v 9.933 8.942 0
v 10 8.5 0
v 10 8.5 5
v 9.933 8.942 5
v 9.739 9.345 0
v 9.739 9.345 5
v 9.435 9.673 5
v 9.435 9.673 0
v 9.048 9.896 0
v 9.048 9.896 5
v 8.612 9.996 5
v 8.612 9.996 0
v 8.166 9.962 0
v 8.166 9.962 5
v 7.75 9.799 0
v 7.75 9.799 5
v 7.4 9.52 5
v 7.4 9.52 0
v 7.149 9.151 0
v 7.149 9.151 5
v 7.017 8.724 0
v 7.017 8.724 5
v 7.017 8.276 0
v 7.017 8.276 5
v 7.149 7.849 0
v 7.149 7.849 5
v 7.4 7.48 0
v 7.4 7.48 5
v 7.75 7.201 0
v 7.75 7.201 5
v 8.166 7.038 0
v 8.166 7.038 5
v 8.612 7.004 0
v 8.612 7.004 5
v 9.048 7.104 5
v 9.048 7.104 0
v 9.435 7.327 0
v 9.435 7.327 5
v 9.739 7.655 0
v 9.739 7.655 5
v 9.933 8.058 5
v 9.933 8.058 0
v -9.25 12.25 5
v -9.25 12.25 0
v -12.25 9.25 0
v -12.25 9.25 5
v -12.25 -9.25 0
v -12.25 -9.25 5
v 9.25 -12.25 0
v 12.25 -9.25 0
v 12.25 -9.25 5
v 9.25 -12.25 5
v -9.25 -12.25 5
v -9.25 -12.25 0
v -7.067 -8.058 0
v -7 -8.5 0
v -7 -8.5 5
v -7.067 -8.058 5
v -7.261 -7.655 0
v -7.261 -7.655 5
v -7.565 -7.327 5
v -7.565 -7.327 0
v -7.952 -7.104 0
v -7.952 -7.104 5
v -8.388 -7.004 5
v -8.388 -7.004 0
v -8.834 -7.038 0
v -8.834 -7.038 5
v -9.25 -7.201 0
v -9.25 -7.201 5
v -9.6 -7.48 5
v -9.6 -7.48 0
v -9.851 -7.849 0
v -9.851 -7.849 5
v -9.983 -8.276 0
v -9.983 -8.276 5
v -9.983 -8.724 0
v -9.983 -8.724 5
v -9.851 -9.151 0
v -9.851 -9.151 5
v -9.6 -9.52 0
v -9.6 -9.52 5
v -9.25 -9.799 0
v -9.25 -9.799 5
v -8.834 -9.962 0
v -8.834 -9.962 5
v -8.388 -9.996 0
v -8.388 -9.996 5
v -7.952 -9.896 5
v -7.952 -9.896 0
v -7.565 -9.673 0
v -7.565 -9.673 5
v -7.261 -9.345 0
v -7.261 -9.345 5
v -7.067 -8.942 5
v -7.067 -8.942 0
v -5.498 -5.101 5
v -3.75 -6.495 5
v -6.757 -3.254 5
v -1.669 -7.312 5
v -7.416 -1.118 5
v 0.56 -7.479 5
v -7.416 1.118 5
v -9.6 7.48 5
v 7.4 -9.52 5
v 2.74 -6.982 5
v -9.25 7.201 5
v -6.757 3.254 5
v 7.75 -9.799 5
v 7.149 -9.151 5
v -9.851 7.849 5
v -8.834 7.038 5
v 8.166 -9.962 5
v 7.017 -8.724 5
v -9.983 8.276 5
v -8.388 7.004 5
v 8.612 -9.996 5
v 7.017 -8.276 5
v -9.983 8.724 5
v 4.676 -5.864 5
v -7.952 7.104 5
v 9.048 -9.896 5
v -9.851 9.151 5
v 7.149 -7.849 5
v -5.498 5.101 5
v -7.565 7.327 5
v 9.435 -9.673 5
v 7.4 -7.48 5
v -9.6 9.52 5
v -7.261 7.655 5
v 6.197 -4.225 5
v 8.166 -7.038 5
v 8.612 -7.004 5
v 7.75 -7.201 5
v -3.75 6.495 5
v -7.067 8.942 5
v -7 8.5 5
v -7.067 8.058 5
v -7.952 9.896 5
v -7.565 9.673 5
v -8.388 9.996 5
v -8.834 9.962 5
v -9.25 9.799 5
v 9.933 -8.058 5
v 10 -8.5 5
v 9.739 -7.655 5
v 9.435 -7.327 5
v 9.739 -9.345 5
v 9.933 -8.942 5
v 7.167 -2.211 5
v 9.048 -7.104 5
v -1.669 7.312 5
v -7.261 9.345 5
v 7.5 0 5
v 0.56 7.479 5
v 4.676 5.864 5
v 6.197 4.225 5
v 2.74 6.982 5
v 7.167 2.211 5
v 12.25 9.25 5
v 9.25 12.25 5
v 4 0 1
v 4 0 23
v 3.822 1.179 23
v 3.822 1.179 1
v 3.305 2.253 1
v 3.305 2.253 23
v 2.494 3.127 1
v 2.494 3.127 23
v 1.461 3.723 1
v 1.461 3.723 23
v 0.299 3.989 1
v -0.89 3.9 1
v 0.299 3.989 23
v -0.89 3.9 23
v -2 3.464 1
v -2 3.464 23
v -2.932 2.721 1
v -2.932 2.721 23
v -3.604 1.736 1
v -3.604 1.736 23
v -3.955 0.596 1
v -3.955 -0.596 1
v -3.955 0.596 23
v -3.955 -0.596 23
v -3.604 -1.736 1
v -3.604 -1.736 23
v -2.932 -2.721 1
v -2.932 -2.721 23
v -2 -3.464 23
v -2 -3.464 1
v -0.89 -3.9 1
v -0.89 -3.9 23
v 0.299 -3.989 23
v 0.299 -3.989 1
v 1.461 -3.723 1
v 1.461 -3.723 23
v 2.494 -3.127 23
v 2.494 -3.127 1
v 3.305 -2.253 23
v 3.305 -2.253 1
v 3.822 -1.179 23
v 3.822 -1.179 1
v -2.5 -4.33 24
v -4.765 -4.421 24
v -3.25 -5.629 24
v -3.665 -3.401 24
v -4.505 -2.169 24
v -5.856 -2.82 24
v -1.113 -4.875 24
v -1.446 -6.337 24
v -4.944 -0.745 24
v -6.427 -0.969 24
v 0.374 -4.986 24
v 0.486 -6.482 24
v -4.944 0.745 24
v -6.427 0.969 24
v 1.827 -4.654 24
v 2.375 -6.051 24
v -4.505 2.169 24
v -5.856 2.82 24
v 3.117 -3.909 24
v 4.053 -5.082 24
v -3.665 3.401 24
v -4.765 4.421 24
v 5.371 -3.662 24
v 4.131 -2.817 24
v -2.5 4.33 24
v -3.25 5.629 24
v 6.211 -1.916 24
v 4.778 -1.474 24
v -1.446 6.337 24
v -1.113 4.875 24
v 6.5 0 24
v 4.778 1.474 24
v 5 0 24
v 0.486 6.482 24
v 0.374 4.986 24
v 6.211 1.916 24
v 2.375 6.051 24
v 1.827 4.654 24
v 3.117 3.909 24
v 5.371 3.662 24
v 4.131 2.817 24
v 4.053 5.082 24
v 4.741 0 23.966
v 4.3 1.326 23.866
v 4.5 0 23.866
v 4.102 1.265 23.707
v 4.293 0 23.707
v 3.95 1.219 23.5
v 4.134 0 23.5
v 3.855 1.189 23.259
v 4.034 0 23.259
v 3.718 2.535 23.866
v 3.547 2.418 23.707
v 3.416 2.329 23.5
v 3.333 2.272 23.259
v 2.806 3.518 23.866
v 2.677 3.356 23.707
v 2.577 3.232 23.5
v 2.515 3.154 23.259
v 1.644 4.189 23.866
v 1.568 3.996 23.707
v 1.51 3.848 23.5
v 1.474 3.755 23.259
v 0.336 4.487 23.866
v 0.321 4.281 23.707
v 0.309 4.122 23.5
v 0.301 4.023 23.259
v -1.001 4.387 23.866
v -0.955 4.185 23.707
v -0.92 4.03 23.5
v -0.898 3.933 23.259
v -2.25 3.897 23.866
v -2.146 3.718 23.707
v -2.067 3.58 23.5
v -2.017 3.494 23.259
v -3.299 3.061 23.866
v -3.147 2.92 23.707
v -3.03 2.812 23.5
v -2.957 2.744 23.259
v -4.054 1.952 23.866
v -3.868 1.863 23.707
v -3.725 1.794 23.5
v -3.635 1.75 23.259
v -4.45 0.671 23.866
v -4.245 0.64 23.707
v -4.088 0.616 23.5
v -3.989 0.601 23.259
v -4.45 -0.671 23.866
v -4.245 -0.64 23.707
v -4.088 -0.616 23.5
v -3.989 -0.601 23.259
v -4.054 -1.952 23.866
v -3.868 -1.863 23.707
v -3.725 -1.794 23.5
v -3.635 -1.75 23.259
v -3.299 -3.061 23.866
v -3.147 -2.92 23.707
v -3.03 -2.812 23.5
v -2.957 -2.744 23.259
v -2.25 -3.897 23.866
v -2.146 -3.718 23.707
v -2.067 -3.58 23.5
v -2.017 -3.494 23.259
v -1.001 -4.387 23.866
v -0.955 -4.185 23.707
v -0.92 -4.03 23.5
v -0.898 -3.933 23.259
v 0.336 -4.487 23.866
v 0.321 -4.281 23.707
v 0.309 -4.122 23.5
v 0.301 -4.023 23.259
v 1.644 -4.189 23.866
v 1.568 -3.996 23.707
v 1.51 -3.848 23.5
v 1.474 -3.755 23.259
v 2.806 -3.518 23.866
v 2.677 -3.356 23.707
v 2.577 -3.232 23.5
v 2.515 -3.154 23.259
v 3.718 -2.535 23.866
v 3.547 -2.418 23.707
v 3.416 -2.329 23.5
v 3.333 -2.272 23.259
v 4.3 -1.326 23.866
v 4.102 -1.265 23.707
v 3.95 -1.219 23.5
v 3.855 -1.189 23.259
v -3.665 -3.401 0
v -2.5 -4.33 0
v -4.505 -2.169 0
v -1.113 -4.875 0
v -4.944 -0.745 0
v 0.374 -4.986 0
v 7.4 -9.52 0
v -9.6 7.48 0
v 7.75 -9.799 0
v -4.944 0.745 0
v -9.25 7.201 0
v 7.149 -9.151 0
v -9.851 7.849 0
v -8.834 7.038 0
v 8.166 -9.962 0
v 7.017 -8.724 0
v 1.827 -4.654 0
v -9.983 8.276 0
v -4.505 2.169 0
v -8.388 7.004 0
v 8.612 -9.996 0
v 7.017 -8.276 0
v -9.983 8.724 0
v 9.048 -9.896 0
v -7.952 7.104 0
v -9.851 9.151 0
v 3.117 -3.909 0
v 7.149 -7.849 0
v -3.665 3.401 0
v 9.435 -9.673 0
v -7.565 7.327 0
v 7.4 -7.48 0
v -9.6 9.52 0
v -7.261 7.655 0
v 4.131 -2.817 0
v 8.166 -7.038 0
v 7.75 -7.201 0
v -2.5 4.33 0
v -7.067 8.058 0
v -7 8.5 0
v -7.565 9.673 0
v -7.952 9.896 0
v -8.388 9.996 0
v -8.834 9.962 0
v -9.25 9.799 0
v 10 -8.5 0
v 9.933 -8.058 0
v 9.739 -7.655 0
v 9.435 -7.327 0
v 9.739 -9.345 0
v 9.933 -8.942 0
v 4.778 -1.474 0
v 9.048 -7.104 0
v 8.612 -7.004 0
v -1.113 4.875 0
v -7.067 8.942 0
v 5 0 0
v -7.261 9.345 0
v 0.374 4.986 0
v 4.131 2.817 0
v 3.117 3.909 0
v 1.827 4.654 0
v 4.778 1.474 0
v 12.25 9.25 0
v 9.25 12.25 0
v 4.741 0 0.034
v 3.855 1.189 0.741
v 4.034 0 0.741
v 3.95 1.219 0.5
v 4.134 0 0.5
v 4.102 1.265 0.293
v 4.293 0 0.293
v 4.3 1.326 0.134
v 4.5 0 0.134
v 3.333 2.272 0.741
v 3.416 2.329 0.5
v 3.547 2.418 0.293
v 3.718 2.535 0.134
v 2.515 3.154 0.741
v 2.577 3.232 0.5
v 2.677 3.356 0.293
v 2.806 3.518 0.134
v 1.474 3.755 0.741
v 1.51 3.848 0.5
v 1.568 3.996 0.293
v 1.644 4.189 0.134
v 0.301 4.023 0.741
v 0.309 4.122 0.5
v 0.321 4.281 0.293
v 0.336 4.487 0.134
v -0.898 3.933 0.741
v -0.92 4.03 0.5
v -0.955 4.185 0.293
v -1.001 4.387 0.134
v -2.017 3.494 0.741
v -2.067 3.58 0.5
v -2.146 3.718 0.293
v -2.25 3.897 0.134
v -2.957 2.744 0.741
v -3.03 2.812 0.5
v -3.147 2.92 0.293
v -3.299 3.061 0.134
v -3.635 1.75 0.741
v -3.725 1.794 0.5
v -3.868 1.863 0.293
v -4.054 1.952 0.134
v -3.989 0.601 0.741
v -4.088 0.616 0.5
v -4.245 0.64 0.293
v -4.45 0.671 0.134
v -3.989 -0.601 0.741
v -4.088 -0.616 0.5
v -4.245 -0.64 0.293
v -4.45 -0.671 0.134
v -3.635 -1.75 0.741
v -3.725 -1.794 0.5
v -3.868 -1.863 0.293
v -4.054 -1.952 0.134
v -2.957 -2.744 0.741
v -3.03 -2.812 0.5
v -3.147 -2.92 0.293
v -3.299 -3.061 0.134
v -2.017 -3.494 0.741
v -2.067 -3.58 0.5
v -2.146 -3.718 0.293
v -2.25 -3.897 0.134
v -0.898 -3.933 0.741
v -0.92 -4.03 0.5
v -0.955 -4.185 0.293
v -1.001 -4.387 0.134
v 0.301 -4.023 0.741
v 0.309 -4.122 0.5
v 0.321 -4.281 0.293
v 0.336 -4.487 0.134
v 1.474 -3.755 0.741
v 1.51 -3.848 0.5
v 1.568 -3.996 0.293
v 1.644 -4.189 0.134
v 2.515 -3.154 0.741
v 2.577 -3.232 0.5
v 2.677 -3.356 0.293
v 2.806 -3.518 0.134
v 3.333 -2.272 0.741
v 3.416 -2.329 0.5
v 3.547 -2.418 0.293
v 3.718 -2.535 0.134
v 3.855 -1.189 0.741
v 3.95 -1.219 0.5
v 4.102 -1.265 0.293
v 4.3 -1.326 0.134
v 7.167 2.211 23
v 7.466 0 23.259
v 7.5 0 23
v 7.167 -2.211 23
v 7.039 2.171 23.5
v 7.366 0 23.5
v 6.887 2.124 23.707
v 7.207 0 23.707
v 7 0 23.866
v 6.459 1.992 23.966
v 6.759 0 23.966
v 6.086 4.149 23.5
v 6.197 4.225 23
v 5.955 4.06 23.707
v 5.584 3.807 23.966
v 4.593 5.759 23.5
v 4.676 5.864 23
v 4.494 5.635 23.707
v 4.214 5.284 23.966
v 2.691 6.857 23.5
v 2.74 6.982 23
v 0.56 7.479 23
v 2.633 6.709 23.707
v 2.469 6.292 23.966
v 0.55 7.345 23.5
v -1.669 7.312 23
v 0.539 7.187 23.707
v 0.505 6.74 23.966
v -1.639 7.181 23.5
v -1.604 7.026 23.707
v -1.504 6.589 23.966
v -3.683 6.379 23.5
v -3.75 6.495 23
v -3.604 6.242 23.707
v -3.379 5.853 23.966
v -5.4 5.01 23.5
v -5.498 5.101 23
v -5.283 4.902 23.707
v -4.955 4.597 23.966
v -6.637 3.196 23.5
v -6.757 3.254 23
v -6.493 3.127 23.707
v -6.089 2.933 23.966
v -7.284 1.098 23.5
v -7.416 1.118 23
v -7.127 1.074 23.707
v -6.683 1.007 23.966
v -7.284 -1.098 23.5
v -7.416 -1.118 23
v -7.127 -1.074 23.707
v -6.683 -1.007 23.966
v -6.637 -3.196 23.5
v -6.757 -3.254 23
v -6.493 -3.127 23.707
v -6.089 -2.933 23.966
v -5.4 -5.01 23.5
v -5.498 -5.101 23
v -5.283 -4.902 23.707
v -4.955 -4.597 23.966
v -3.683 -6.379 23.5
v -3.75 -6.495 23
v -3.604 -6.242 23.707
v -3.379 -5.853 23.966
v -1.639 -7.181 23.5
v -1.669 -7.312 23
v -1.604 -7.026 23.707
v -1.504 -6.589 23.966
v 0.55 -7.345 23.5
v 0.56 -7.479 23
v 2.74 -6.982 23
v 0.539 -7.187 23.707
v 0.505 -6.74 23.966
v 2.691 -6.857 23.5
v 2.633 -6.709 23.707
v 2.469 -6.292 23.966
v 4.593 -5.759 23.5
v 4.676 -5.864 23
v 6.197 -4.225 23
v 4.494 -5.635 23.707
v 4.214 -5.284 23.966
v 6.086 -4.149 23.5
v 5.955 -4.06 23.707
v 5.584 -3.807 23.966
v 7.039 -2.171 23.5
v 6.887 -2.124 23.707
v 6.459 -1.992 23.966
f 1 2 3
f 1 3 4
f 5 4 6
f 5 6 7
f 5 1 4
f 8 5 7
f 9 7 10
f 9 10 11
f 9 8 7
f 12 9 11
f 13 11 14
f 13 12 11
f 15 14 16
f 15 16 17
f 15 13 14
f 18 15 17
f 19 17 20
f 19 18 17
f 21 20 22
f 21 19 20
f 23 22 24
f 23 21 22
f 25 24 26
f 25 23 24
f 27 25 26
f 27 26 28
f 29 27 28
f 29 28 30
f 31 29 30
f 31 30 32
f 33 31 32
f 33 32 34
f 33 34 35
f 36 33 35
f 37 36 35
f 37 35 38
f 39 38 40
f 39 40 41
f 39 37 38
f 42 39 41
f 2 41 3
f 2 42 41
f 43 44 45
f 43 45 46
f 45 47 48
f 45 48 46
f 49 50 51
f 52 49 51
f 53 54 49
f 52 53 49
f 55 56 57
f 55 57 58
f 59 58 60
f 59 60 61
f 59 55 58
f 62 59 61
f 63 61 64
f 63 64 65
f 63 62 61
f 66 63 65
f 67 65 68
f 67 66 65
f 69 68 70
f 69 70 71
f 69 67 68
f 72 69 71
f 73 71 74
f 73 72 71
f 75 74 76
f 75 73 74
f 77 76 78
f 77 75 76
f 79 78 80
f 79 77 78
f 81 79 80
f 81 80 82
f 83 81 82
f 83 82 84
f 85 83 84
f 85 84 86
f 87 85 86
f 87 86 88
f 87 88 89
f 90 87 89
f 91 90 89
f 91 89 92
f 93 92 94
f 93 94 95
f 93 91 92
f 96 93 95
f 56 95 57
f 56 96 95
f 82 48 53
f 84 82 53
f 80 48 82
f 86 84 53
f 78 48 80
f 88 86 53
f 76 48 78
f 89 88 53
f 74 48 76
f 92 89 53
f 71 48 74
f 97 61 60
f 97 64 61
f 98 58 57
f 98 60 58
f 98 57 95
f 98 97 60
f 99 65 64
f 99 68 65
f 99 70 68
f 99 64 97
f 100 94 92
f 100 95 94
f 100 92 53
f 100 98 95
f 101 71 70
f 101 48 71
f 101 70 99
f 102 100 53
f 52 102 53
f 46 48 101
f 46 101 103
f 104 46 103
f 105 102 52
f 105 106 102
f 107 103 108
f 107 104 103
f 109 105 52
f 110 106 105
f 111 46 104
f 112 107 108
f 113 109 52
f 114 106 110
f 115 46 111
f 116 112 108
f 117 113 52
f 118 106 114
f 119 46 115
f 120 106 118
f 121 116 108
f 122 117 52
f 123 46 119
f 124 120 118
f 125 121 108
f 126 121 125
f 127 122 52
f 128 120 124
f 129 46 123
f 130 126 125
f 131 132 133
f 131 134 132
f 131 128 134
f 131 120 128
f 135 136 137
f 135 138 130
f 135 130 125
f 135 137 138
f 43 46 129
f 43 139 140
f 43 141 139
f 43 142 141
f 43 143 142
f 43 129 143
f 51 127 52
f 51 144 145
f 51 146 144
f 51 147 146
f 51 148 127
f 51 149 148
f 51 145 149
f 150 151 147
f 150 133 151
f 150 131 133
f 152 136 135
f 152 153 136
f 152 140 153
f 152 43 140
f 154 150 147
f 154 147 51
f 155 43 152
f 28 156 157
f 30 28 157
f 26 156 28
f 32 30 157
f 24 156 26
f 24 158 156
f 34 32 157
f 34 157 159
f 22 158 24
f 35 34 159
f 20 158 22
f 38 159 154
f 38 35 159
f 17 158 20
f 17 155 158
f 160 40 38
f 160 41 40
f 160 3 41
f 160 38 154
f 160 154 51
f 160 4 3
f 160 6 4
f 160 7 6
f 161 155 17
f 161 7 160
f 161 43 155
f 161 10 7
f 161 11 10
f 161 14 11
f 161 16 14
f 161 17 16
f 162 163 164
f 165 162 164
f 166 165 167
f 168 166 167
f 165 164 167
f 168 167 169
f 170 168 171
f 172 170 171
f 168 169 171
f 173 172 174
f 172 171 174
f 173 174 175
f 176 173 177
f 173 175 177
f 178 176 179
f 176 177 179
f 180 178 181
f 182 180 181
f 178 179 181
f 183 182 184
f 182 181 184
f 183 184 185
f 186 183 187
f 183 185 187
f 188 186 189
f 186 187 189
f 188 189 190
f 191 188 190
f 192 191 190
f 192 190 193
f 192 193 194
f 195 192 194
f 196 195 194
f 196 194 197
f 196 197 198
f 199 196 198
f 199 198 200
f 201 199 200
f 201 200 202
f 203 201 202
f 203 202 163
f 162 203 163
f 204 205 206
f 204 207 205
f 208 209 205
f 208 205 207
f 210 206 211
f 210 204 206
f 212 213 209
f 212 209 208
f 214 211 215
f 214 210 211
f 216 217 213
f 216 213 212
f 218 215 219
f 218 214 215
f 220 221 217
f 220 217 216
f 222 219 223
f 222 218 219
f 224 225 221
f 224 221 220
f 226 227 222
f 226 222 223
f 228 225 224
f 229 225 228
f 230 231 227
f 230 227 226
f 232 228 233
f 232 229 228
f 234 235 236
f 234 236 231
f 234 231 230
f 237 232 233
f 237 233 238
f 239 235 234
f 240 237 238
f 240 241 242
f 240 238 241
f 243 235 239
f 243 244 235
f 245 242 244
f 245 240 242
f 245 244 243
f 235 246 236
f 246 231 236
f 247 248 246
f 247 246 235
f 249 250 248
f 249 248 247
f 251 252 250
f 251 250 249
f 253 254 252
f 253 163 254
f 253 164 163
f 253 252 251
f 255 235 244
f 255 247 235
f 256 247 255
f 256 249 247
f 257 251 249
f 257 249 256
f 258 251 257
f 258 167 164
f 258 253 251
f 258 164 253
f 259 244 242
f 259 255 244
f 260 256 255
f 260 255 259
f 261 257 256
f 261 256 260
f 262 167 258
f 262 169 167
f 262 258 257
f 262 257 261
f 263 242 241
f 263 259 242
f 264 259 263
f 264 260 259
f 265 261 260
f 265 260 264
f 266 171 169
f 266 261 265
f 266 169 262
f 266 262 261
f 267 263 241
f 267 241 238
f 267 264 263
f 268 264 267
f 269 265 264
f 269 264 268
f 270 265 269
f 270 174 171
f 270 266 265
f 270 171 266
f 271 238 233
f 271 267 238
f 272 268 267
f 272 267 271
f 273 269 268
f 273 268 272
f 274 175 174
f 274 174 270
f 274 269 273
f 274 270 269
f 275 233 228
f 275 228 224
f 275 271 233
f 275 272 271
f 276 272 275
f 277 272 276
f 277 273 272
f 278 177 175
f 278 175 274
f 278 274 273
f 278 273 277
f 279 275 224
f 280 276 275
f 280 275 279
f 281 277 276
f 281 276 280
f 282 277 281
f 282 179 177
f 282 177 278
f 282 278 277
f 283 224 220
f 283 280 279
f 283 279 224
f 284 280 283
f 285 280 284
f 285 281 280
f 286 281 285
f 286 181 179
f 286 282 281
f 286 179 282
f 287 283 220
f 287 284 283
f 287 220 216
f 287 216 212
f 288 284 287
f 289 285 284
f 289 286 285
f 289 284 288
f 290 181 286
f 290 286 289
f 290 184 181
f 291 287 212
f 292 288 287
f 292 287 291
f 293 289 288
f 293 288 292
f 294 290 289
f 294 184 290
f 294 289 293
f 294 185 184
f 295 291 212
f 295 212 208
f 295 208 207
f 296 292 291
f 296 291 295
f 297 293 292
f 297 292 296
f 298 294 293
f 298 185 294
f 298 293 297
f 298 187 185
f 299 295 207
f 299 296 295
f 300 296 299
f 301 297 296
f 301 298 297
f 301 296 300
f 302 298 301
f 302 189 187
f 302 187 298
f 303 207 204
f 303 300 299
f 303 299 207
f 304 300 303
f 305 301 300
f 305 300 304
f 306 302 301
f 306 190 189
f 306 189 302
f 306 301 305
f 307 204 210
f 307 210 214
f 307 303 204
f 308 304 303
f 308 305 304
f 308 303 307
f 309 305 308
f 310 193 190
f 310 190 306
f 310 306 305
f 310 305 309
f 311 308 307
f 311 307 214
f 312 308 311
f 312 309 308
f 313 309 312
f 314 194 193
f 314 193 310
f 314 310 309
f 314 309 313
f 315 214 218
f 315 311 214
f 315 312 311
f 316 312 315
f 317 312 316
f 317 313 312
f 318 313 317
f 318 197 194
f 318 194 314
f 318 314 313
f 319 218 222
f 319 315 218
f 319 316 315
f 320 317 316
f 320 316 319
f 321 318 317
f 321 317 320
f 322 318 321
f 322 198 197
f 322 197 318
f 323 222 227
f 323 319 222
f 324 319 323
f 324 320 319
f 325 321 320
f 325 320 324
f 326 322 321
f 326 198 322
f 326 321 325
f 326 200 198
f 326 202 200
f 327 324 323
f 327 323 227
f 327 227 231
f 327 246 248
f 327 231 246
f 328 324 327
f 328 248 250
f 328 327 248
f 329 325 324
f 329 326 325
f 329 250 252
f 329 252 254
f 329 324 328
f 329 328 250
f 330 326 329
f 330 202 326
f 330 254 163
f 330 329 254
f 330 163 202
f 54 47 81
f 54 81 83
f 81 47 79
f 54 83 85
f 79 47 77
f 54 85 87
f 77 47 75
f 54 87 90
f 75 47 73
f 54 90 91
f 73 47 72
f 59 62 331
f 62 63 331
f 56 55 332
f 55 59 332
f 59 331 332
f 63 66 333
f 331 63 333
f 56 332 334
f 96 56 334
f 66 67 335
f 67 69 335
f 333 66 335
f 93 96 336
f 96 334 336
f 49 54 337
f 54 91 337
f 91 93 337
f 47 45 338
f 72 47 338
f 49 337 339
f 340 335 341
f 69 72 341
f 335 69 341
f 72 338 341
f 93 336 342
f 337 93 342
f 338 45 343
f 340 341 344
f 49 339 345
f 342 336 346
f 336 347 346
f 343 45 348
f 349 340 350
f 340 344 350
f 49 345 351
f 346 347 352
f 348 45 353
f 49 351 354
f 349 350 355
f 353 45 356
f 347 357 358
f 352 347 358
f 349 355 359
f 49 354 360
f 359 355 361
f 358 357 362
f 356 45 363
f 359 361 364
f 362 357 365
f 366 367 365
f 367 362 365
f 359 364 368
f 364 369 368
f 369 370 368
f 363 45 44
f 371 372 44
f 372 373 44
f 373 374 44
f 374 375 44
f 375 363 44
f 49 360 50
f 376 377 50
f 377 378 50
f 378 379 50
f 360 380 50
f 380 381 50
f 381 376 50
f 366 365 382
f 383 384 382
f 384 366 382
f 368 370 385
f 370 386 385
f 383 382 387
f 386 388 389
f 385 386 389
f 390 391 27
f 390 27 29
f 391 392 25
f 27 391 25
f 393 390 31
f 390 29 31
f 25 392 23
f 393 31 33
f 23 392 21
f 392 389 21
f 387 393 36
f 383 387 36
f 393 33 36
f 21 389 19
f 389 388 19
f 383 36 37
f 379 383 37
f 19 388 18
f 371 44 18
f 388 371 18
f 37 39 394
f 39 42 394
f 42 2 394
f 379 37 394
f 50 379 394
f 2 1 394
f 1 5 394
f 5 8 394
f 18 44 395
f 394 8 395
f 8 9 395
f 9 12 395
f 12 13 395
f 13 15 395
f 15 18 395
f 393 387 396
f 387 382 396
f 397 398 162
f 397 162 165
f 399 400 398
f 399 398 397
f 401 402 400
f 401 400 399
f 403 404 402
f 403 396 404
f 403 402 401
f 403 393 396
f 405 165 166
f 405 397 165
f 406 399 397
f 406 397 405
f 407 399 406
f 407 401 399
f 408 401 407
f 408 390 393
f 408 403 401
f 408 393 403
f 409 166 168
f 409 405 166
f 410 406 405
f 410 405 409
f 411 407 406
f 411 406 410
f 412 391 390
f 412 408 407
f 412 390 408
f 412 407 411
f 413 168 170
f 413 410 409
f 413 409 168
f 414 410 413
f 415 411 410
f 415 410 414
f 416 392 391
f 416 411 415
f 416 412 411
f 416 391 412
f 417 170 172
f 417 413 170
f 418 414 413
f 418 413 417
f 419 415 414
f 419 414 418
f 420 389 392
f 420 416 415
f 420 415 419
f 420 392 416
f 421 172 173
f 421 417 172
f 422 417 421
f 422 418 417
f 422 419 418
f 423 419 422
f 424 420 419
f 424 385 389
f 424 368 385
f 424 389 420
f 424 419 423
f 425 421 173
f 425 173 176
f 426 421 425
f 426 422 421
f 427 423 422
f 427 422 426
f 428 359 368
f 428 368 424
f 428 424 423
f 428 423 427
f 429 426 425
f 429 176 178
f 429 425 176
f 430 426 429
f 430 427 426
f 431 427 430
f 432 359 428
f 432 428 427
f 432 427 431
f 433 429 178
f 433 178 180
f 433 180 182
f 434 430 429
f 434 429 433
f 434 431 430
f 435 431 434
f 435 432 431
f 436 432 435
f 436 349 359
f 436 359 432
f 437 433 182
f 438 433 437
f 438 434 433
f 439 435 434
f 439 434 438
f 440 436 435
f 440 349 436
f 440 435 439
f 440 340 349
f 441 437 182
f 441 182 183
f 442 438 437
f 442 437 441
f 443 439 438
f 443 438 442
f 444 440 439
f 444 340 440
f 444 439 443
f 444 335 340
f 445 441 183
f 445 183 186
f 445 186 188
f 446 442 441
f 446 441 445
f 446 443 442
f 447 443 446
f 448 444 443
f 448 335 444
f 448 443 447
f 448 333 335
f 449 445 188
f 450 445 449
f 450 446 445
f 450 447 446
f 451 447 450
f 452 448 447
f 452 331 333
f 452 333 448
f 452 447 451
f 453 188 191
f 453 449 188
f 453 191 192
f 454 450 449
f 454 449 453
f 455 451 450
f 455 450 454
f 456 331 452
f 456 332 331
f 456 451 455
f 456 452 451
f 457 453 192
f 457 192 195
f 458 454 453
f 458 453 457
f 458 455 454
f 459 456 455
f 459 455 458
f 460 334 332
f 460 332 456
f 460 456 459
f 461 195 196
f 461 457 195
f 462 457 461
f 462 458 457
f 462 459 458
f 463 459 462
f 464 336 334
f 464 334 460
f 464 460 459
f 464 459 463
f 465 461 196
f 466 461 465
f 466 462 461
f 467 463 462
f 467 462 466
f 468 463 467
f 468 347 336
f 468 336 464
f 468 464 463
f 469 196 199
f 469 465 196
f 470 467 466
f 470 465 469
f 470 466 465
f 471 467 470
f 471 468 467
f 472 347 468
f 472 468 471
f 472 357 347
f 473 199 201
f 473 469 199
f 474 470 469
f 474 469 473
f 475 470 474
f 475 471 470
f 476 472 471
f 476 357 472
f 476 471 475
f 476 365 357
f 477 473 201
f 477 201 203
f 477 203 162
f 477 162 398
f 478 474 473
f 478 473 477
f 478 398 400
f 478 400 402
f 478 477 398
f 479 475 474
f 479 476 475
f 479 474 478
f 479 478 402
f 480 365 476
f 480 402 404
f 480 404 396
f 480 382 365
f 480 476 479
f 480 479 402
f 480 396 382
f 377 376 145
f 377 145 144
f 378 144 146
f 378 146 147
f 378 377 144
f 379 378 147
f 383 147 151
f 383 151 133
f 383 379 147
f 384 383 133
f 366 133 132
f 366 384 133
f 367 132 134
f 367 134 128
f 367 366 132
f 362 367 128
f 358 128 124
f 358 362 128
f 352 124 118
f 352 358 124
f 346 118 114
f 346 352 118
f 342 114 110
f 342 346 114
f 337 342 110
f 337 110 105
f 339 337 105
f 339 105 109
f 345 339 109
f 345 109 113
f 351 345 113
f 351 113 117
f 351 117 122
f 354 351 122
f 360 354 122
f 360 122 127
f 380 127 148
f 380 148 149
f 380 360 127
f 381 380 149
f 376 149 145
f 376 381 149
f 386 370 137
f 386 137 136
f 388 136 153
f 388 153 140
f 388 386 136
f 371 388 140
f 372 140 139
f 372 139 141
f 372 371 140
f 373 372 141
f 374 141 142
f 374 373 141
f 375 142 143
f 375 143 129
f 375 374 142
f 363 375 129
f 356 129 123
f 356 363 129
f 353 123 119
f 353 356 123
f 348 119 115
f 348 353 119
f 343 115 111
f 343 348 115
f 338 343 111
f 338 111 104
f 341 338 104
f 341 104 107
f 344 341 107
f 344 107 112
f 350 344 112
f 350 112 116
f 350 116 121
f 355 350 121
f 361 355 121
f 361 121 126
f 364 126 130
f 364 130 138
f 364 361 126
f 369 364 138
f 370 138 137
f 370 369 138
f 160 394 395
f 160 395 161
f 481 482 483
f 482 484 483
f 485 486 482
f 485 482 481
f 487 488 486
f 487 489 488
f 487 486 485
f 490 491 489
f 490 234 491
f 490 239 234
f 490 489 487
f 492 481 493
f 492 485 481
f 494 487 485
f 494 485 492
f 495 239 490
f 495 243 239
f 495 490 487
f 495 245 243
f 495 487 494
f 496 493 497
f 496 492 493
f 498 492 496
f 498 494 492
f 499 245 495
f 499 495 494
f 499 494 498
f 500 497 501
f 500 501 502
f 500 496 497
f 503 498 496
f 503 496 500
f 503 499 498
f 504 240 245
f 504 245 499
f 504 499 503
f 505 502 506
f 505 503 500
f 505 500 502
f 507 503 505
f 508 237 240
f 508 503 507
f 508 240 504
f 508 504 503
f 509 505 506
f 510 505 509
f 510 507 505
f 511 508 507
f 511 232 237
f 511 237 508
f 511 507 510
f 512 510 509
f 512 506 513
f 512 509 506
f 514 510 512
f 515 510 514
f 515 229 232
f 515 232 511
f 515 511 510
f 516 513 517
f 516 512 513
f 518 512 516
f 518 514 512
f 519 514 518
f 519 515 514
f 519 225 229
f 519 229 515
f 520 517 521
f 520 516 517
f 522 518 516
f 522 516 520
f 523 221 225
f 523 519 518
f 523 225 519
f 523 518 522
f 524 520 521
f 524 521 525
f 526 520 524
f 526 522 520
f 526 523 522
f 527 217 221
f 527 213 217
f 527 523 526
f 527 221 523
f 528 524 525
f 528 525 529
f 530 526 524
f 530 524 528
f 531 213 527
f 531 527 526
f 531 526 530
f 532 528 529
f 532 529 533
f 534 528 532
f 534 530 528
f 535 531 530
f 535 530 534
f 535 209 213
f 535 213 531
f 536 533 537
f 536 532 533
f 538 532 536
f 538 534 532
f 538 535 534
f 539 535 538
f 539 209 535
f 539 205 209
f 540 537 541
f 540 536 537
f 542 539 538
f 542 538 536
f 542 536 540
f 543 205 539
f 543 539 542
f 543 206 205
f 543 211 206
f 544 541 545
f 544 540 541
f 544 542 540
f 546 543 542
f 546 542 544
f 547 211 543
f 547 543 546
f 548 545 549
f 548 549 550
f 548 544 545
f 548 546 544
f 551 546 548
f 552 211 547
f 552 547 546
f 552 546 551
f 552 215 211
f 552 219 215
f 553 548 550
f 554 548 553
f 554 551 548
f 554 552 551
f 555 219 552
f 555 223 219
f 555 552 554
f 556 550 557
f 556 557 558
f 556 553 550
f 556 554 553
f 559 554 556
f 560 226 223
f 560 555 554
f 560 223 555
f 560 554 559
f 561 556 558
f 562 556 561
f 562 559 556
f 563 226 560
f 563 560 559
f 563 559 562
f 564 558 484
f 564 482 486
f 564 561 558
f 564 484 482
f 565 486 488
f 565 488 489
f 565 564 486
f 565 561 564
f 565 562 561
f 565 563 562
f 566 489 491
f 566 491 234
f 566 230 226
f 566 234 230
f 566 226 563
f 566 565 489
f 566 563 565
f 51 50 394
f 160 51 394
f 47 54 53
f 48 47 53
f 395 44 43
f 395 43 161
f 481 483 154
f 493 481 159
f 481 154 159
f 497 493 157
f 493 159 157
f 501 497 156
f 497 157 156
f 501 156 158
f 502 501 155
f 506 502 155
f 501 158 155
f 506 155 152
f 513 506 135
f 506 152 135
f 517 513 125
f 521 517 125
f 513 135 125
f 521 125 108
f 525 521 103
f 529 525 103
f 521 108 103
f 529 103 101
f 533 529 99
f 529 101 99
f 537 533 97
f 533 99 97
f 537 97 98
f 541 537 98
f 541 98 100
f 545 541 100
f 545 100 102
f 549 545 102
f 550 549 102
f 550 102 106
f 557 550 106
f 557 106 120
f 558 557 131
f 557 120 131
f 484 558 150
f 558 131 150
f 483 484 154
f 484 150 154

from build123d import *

# Parameters (mm, degrees)
SKETCH_W        = 24.5
SKETCH_H        = 24.5
SKETCH_R        = 1.5
PAD_DEPTH       = 5
SKETCH001_R     = 7.5
PAD001_DEPTH    = 19
SKETCH002_R     = 4
POCKET_DEPTH    = 24.001
CHAMFER_SIZE    = 3
CHAMFER001_SIZE = 3
FILLET_R        = 1
FILLET001_R     = 1
FILLET002_R     = 1


with BuildPart() as part:
    # Sketch → Pad (new body)
    with BuildSketch(Plane.XY):
        Rectangle(SKETCH_W, SKETCH_H)
        with Locations((-8.5, 8.5)):
            Circle(SKETCH_R, mode=Mode.SUBTRACT)
        with Locations((8.5, 8.5)):
            Circle(SKETCH_R, mode=Mode.SUBTRACT)
        with Locations((8.5, -8.5)):
            Circle(SKETCH_R, mode=Mode.SUBTRACT)
        with Locations((-8.5, -8.5)):
            Circle(SKETCH_R, mode=Mode.SUBTRACT)
    extrude(amount=PAD_DEPTH)

    # Sketch001 (on Face10 of Pad) → Pad001 (join)
    with BuildSketch(Plane.XY.offset(5)):
        Circle(SKETCH001_R)
    extrude(amount=PAD001_DEPTH)

    # Sketch002 (on Face12 of Pad001) → Pocket (cut, through all)
    with BuildSketch(Plane.XY.offset(24)):
        Circle(SKETCH002_R)
    extrude(amount=-POCKET_DEPTH, mode=Mode.SUBTRACT)

    # Chamfer
    chamfer_edges = [part.edges().sort_by_distance(p)[0] for p in [
        (12.25, -12.25, 2.5),
        (12.25, 12.25, 2.5),
        (-12.25, 12.25, 2.5),
    ]]
    chamfer(chamfer_edges, length=CHAMFER_SIZE)

    # Chamfer001
    chamfer001_edges = [part.edges().sort_by_distance(p)[0] for p in [
        (-12.25, -12.25, 2.5),
    ]]
    chamfer(chamfer001_edges, length=CHAMFER001_SIZE)

    # Fillet
    fillet_edges = [part.edges().sort_by_distance(p)[0] for p in [
        (-7.5, 0, 24),
    ]]
    fillet(fillet_edges, radius=FILLET_R)

    # Fillet001
    fillet001_edges = [part.edges().sort_by_distance(p)[0] for p in [
        (-4, 0, 24),
    ]]
    fillet(fillet001_edges, radius=FILLET001_R)

    # Fillet002
    fillet002_edges = [part.edges().sort_by_distance(p)[0] for p in [
        (-4, 0, 0),
    ]]
    fillet(fillet002_edges, radius=FILLET002_R)


solid = part.part
